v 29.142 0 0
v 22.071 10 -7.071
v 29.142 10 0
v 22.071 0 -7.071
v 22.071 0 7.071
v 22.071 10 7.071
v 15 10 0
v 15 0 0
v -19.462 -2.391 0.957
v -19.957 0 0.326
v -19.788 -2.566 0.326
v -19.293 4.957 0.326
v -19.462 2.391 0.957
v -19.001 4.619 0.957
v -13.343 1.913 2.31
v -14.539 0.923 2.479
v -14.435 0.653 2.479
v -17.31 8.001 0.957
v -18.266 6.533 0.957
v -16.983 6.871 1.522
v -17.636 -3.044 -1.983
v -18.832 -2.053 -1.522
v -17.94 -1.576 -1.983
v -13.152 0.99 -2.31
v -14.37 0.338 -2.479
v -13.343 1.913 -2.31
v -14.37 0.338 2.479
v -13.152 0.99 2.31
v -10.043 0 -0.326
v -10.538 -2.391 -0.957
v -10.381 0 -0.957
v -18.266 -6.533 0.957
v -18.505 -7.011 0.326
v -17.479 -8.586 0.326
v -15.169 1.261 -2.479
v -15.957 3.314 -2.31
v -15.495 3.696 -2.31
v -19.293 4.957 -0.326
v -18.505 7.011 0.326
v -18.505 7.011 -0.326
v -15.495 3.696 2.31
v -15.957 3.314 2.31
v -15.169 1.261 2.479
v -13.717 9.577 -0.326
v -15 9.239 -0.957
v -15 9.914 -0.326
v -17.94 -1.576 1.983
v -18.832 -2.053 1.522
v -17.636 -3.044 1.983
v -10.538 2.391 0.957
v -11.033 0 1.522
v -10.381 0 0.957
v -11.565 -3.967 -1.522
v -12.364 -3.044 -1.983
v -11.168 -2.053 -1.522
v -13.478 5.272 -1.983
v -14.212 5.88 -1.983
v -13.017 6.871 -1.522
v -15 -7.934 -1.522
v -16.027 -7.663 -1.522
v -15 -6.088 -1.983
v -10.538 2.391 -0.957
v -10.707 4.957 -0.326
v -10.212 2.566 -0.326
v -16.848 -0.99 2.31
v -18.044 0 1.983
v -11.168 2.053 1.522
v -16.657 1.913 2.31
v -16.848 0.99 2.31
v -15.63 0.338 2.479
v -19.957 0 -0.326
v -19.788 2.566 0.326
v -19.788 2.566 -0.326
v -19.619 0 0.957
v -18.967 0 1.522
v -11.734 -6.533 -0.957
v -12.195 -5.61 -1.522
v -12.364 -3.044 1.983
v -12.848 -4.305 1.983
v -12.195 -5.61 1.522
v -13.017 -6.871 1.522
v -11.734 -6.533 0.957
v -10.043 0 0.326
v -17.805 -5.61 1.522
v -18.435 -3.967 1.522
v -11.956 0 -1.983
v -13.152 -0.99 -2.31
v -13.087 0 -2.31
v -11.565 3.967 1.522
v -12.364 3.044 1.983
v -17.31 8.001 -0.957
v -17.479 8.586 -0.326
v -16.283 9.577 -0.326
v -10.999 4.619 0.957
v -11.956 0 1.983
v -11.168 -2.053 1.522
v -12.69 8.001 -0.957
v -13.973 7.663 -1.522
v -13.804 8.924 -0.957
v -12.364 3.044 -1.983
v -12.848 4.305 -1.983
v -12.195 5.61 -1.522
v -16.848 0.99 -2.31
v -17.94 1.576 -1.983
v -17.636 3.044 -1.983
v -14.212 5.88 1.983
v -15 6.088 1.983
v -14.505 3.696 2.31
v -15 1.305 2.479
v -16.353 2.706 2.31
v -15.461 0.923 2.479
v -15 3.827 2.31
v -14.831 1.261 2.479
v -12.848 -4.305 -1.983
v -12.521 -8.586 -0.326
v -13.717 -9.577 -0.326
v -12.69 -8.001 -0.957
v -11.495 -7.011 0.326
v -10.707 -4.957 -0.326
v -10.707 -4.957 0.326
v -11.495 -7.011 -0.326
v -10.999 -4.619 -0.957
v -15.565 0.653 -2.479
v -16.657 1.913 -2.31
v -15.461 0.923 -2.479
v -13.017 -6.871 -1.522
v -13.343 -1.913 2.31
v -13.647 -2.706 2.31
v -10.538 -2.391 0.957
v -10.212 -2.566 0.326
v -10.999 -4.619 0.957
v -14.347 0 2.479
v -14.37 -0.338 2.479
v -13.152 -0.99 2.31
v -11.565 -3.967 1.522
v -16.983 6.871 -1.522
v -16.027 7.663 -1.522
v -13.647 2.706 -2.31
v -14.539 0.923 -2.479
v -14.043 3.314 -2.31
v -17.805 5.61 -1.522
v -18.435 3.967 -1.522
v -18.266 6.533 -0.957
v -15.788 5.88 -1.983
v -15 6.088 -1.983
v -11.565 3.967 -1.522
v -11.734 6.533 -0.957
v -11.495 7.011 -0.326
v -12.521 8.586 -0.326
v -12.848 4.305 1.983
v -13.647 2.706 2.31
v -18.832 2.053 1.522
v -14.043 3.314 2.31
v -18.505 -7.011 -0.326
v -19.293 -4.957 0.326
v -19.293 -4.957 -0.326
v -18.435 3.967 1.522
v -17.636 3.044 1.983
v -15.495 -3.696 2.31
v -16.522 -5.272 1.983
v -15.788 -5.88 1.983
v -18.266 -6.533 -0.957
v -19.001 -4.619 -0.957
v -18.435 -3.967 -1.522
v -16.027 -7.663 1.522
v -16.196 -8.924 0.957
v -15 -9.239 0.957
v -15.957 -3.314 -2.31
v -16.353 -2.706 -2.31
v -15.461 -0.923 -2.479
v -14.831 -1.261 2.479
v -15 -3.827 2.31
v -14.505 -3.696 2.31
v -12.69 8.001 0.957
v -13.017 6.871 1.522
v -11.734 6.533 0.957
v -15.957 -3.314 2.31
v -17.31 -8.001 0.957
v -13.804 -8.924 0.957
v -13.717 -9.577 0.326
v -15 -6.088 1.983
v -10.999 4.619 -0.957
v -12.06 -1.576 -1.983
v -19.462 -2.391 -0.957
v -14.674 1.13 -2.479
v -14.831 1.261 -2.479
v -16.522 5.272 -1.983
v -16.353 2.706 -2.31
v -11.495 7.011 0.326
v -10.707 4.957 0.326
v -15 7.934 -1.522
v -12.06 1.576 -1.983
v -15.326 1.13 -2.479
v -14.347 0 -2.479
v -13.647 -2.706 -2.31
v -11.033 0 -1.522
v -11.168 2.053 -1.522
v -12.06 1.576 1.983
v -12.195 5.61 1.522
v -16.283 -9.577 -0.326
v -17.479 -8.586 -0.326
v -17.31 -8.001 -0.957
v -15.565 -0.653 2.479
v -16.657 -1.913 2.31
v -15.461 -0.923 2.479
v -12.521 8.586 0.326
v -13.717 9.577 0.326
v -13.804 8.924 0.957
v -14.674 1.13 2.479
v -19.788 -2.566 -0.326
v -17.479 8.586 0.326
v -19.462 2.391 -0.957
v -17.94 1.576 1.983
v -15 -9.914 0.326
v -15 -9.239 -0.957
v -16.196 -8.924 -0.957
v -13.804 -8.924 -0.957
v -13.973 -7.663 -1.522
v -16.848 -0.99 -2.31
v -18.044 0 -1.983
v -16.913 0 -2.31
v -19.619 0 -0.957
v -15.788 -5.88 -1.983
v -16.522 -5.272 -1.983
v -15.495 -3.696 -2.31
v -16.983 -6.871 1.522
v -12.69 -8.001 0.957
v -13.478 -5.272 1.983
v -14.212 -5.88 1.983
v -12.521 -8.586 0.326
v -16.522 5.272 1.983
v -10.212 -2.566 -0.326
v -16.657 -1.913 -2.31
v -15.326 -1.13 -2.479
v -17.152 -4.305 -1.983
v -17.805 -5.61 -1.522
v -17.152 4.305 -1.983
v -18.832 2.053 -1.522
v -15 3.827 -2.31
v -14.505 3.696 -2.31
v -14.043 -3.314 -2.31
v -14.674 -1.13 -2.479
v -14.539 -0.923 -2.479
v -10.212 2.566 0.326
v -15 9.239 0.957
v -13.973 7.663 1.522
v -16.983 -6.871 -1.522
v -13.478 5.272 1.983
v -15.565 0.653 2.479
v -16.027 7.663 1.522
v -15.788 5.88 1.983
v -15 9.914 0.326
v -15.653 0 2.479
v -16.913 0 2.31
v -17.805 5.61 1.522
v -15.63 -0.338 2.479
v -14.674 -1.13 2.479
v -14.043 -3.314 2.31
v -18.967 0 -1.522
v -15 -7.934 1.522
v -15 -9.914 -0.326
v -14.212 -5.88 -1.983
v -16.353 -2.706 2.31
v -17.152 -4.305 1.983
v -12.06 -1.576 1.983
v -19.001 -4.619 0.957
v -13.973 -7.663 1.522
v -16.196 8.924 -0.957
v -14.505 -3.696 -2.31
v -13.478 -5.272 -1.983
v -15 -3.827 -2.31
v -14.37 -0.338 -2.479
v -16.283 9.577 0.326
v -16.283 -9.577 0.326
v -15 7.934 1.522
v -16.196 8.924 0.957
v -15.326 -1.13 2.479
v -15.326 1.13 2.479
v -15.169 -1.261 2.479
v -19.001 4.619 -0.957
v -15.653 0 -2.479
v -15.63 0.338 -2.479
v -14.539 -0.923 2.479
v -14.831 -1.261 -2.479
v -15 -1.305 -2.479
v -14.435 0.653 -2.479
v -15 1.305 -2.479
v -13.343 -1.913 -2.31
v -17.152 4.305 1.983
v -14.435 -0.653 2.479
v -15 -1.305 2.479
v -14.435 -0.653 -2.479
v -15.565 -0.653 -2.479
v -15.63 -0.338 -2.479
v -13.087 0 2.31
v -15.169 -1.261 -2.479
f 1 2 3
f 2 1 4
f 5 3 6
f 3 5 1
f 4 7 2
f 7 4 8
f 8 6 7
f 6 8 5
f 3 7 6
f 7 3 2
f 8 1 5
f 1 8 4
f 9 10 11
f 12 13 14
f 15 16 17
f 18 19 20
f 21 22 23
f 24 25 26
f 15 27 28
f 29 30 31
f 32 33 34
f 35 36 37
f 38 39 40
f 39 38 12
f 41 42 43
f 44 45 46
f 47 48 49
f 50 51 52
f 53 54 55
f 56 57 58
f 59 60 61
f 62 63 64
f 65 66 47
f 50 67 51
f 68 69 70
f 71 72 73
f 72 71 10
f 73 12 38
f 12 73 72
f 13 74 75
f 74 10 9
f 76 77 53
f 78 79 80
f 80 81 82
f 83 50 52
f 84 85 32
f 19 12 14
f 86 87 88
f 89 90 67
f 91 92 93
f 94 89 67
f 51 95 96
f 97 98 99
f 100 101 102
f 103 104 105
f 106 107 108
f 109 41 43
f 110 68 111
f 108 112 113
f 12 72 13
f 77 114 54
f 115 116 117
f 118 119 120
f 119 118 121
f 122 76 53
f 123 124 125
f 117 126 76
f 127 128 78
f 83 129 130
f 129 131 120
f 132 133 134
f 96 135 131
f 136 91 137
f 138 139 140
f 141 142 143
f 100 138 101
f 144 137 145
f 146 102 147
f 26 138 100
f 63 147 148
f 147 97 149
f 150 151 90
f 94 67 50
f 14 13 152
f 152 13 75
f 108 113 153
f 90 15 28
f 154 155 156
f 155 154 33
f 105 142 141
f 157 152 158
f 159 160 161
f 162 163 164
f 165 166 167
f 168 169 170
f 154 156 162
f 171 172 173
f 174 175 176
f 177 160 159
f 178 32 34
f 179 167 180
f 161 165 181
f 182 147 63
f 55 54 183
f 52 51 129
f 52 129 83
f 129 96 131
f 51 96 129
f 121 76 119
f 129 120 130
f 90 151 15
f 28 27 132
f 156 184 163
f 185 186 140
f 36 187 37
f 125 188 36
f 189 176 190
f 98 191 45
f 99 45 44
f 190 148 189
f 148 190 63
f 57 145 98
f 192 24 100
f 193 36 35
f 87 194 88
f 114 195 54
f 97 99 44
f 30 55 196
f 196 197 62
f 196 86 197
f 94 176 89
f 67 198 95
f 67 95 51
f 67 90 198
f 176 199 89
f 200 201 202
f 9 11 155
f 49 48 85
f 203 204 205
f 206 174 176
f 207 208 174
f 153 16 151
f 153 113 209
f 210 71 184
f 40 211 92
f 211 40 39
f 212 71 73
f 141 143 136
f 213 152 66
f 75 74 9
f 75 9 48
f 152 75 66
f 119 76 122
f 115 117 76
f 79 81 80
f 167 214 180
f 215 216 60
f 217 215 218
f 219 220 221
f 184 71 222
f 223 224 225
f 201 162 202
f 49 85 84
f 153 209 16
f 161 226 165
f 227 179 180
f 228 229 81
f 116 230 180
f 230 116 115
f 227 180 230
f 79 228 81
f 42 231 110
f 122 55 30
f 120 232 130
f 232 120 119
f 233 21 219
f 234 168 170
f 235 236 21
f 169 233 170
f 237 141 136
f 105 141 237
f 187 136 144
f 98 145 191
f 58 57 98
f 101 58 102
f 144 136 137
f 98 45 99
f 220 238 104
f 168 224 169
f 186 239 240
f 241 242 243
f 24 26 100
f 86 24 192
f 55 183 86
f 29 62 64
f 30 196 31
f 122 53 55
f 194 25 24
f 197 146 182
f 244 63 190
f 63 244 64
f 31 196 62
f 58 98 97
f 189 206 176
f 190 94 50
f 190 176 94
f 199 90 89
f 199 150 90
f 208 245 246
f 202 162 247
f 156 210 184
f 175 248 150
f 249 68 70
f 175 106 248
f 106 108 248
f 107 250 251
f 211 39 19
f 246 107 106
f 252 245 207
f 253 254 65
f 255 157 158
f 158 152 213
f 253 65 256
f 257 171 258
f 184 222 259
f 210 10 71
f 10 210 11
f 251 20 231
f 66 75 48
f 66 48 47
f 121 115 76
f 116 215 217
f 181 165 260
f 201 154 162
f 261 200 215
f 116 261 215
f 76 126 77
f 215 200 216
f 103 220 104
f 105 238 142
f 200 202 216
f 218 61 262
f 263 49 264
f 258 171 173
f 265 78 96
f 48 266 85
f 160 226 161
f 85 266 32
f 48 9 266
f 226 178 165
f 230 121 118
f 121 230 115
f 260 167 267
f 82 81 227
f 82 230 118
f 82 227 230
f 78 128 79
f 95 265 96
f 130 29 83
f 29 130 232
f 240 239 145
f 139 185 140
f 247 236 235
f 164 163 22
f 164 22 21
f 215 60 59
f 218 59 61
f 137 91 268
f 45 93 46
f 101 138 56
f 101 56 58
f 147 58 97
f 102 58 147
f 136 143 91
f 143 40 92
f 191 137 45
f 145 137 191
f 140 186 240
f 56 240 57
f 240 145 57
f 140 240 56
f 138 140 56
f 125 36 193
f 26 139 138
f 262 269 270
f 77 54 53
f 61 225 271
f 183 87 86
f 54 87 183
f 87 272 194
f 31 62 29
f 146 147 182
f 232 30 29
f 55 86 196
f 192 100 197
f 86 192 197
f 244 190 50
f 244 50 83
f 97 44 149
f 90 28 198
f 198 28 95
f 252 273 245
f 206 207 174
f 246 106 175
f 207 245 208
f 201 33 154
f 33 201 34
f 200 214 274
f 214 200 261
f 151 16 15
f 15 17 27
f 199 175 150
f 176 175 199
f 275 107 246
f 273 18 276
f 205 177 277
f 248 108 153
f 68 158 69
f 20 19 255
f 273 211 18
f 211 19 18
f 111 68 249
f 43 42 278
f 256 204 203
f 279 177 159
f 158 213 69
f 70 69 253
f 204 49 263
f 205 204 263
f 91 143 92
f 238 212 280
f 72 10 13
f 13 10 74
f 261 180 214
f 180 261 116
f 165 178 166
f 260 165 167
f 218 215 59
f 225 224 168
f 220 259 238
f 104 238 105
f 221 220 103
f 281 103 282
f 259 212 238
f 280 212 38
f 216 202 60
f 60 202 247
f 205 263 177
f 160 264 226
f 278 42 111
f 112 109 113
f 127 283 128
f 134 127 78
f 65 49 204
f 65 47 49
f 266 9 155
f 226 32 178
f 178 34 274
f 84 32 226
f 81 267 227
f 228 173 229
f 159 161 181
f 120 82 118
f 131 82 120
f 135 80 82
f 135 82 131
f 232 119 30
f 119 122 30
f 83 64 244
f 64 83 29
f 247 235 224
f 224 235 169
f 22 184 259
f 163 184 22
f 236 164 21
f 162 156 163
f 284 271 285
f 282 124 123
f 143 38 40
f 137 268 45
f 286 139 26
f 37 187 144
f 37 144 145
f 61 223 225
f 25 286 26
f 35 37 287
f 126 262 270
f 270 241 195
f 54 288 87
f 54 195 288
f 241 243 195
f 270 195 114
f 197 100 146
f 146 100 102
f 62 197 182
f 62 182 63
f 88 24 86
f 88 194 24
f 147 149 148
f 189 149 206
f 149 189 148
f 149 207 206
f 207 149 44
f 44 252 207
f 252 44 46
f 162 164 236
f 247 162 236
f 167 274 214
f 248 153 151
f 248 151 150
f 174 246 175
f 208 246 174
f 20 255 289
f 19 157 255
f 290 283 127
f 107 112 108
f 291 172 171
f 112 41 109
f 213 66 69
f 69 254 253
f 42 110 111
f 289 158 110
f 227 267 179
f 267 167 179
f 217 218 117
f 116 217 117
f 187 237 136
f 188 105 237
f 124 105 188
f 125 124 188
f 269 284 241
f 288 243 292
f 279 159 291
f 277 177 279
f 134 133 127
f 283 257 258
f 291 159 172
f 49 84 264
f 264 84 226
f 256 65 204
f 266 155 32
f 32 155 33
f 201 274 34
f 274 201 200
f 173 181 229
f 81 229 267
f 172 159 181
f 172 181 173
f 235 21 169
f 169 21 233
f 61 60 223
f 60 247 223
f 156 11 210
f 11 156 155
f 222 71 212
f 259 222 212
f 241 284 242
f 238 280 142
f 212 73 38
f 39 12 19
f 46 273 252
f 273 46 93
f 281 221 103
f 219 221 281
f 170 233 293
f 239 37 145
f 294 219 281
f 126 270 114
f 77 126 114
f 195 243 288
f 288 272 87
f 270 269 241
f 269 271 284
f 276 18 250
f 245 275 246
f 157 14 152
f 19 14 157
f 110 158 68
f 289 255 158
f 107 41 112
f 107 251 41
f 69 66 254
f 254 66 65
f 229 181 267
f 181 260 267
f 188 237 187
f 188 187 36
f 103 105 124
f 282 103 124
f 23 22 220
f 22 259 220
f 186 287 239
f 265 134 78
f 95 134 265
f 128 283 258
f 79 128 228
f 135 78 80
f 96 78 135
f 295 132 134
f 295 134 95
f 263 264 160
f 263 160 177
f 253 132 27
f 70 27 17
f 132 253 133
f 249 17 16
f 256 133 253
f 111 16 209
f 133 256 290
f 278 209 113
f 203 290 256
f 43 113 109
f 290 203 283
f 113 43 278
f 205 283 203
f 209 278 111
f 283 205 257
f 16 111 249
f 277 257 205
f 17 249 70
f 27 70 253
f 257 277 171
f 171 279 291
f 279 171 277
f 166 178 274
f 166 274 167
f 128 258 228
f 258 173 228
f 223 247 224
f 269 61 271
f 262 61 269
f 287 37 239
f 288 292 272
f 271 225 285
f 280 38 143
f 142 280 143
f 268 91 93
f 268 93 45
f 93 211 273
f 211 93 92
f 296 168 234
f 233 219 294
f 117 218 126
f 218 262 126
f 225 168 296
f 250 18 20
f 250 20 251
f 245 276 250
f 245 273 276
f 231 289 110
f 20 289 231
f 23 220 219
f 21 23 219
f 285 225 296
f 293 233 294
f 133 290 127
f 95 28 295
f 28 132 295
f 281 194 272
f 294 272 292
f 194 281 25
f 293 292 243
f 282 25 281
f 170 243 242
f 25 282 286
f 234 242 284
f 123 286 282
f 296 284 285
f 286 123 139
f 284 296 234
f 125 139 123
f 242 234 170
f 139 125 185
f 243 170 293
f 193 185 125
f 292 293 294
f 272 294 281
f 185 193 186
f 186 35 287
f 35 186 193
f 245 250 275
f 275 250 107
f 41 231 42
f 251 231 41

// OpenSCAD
translate([15, 0, 0])
    rotate([0, 45, 0])
        cube([10, 10, 10]);

translate([-15, 0, 0])
    scale([1, 2, 0.5])
        sphere(r = 5, $fn = 24);
